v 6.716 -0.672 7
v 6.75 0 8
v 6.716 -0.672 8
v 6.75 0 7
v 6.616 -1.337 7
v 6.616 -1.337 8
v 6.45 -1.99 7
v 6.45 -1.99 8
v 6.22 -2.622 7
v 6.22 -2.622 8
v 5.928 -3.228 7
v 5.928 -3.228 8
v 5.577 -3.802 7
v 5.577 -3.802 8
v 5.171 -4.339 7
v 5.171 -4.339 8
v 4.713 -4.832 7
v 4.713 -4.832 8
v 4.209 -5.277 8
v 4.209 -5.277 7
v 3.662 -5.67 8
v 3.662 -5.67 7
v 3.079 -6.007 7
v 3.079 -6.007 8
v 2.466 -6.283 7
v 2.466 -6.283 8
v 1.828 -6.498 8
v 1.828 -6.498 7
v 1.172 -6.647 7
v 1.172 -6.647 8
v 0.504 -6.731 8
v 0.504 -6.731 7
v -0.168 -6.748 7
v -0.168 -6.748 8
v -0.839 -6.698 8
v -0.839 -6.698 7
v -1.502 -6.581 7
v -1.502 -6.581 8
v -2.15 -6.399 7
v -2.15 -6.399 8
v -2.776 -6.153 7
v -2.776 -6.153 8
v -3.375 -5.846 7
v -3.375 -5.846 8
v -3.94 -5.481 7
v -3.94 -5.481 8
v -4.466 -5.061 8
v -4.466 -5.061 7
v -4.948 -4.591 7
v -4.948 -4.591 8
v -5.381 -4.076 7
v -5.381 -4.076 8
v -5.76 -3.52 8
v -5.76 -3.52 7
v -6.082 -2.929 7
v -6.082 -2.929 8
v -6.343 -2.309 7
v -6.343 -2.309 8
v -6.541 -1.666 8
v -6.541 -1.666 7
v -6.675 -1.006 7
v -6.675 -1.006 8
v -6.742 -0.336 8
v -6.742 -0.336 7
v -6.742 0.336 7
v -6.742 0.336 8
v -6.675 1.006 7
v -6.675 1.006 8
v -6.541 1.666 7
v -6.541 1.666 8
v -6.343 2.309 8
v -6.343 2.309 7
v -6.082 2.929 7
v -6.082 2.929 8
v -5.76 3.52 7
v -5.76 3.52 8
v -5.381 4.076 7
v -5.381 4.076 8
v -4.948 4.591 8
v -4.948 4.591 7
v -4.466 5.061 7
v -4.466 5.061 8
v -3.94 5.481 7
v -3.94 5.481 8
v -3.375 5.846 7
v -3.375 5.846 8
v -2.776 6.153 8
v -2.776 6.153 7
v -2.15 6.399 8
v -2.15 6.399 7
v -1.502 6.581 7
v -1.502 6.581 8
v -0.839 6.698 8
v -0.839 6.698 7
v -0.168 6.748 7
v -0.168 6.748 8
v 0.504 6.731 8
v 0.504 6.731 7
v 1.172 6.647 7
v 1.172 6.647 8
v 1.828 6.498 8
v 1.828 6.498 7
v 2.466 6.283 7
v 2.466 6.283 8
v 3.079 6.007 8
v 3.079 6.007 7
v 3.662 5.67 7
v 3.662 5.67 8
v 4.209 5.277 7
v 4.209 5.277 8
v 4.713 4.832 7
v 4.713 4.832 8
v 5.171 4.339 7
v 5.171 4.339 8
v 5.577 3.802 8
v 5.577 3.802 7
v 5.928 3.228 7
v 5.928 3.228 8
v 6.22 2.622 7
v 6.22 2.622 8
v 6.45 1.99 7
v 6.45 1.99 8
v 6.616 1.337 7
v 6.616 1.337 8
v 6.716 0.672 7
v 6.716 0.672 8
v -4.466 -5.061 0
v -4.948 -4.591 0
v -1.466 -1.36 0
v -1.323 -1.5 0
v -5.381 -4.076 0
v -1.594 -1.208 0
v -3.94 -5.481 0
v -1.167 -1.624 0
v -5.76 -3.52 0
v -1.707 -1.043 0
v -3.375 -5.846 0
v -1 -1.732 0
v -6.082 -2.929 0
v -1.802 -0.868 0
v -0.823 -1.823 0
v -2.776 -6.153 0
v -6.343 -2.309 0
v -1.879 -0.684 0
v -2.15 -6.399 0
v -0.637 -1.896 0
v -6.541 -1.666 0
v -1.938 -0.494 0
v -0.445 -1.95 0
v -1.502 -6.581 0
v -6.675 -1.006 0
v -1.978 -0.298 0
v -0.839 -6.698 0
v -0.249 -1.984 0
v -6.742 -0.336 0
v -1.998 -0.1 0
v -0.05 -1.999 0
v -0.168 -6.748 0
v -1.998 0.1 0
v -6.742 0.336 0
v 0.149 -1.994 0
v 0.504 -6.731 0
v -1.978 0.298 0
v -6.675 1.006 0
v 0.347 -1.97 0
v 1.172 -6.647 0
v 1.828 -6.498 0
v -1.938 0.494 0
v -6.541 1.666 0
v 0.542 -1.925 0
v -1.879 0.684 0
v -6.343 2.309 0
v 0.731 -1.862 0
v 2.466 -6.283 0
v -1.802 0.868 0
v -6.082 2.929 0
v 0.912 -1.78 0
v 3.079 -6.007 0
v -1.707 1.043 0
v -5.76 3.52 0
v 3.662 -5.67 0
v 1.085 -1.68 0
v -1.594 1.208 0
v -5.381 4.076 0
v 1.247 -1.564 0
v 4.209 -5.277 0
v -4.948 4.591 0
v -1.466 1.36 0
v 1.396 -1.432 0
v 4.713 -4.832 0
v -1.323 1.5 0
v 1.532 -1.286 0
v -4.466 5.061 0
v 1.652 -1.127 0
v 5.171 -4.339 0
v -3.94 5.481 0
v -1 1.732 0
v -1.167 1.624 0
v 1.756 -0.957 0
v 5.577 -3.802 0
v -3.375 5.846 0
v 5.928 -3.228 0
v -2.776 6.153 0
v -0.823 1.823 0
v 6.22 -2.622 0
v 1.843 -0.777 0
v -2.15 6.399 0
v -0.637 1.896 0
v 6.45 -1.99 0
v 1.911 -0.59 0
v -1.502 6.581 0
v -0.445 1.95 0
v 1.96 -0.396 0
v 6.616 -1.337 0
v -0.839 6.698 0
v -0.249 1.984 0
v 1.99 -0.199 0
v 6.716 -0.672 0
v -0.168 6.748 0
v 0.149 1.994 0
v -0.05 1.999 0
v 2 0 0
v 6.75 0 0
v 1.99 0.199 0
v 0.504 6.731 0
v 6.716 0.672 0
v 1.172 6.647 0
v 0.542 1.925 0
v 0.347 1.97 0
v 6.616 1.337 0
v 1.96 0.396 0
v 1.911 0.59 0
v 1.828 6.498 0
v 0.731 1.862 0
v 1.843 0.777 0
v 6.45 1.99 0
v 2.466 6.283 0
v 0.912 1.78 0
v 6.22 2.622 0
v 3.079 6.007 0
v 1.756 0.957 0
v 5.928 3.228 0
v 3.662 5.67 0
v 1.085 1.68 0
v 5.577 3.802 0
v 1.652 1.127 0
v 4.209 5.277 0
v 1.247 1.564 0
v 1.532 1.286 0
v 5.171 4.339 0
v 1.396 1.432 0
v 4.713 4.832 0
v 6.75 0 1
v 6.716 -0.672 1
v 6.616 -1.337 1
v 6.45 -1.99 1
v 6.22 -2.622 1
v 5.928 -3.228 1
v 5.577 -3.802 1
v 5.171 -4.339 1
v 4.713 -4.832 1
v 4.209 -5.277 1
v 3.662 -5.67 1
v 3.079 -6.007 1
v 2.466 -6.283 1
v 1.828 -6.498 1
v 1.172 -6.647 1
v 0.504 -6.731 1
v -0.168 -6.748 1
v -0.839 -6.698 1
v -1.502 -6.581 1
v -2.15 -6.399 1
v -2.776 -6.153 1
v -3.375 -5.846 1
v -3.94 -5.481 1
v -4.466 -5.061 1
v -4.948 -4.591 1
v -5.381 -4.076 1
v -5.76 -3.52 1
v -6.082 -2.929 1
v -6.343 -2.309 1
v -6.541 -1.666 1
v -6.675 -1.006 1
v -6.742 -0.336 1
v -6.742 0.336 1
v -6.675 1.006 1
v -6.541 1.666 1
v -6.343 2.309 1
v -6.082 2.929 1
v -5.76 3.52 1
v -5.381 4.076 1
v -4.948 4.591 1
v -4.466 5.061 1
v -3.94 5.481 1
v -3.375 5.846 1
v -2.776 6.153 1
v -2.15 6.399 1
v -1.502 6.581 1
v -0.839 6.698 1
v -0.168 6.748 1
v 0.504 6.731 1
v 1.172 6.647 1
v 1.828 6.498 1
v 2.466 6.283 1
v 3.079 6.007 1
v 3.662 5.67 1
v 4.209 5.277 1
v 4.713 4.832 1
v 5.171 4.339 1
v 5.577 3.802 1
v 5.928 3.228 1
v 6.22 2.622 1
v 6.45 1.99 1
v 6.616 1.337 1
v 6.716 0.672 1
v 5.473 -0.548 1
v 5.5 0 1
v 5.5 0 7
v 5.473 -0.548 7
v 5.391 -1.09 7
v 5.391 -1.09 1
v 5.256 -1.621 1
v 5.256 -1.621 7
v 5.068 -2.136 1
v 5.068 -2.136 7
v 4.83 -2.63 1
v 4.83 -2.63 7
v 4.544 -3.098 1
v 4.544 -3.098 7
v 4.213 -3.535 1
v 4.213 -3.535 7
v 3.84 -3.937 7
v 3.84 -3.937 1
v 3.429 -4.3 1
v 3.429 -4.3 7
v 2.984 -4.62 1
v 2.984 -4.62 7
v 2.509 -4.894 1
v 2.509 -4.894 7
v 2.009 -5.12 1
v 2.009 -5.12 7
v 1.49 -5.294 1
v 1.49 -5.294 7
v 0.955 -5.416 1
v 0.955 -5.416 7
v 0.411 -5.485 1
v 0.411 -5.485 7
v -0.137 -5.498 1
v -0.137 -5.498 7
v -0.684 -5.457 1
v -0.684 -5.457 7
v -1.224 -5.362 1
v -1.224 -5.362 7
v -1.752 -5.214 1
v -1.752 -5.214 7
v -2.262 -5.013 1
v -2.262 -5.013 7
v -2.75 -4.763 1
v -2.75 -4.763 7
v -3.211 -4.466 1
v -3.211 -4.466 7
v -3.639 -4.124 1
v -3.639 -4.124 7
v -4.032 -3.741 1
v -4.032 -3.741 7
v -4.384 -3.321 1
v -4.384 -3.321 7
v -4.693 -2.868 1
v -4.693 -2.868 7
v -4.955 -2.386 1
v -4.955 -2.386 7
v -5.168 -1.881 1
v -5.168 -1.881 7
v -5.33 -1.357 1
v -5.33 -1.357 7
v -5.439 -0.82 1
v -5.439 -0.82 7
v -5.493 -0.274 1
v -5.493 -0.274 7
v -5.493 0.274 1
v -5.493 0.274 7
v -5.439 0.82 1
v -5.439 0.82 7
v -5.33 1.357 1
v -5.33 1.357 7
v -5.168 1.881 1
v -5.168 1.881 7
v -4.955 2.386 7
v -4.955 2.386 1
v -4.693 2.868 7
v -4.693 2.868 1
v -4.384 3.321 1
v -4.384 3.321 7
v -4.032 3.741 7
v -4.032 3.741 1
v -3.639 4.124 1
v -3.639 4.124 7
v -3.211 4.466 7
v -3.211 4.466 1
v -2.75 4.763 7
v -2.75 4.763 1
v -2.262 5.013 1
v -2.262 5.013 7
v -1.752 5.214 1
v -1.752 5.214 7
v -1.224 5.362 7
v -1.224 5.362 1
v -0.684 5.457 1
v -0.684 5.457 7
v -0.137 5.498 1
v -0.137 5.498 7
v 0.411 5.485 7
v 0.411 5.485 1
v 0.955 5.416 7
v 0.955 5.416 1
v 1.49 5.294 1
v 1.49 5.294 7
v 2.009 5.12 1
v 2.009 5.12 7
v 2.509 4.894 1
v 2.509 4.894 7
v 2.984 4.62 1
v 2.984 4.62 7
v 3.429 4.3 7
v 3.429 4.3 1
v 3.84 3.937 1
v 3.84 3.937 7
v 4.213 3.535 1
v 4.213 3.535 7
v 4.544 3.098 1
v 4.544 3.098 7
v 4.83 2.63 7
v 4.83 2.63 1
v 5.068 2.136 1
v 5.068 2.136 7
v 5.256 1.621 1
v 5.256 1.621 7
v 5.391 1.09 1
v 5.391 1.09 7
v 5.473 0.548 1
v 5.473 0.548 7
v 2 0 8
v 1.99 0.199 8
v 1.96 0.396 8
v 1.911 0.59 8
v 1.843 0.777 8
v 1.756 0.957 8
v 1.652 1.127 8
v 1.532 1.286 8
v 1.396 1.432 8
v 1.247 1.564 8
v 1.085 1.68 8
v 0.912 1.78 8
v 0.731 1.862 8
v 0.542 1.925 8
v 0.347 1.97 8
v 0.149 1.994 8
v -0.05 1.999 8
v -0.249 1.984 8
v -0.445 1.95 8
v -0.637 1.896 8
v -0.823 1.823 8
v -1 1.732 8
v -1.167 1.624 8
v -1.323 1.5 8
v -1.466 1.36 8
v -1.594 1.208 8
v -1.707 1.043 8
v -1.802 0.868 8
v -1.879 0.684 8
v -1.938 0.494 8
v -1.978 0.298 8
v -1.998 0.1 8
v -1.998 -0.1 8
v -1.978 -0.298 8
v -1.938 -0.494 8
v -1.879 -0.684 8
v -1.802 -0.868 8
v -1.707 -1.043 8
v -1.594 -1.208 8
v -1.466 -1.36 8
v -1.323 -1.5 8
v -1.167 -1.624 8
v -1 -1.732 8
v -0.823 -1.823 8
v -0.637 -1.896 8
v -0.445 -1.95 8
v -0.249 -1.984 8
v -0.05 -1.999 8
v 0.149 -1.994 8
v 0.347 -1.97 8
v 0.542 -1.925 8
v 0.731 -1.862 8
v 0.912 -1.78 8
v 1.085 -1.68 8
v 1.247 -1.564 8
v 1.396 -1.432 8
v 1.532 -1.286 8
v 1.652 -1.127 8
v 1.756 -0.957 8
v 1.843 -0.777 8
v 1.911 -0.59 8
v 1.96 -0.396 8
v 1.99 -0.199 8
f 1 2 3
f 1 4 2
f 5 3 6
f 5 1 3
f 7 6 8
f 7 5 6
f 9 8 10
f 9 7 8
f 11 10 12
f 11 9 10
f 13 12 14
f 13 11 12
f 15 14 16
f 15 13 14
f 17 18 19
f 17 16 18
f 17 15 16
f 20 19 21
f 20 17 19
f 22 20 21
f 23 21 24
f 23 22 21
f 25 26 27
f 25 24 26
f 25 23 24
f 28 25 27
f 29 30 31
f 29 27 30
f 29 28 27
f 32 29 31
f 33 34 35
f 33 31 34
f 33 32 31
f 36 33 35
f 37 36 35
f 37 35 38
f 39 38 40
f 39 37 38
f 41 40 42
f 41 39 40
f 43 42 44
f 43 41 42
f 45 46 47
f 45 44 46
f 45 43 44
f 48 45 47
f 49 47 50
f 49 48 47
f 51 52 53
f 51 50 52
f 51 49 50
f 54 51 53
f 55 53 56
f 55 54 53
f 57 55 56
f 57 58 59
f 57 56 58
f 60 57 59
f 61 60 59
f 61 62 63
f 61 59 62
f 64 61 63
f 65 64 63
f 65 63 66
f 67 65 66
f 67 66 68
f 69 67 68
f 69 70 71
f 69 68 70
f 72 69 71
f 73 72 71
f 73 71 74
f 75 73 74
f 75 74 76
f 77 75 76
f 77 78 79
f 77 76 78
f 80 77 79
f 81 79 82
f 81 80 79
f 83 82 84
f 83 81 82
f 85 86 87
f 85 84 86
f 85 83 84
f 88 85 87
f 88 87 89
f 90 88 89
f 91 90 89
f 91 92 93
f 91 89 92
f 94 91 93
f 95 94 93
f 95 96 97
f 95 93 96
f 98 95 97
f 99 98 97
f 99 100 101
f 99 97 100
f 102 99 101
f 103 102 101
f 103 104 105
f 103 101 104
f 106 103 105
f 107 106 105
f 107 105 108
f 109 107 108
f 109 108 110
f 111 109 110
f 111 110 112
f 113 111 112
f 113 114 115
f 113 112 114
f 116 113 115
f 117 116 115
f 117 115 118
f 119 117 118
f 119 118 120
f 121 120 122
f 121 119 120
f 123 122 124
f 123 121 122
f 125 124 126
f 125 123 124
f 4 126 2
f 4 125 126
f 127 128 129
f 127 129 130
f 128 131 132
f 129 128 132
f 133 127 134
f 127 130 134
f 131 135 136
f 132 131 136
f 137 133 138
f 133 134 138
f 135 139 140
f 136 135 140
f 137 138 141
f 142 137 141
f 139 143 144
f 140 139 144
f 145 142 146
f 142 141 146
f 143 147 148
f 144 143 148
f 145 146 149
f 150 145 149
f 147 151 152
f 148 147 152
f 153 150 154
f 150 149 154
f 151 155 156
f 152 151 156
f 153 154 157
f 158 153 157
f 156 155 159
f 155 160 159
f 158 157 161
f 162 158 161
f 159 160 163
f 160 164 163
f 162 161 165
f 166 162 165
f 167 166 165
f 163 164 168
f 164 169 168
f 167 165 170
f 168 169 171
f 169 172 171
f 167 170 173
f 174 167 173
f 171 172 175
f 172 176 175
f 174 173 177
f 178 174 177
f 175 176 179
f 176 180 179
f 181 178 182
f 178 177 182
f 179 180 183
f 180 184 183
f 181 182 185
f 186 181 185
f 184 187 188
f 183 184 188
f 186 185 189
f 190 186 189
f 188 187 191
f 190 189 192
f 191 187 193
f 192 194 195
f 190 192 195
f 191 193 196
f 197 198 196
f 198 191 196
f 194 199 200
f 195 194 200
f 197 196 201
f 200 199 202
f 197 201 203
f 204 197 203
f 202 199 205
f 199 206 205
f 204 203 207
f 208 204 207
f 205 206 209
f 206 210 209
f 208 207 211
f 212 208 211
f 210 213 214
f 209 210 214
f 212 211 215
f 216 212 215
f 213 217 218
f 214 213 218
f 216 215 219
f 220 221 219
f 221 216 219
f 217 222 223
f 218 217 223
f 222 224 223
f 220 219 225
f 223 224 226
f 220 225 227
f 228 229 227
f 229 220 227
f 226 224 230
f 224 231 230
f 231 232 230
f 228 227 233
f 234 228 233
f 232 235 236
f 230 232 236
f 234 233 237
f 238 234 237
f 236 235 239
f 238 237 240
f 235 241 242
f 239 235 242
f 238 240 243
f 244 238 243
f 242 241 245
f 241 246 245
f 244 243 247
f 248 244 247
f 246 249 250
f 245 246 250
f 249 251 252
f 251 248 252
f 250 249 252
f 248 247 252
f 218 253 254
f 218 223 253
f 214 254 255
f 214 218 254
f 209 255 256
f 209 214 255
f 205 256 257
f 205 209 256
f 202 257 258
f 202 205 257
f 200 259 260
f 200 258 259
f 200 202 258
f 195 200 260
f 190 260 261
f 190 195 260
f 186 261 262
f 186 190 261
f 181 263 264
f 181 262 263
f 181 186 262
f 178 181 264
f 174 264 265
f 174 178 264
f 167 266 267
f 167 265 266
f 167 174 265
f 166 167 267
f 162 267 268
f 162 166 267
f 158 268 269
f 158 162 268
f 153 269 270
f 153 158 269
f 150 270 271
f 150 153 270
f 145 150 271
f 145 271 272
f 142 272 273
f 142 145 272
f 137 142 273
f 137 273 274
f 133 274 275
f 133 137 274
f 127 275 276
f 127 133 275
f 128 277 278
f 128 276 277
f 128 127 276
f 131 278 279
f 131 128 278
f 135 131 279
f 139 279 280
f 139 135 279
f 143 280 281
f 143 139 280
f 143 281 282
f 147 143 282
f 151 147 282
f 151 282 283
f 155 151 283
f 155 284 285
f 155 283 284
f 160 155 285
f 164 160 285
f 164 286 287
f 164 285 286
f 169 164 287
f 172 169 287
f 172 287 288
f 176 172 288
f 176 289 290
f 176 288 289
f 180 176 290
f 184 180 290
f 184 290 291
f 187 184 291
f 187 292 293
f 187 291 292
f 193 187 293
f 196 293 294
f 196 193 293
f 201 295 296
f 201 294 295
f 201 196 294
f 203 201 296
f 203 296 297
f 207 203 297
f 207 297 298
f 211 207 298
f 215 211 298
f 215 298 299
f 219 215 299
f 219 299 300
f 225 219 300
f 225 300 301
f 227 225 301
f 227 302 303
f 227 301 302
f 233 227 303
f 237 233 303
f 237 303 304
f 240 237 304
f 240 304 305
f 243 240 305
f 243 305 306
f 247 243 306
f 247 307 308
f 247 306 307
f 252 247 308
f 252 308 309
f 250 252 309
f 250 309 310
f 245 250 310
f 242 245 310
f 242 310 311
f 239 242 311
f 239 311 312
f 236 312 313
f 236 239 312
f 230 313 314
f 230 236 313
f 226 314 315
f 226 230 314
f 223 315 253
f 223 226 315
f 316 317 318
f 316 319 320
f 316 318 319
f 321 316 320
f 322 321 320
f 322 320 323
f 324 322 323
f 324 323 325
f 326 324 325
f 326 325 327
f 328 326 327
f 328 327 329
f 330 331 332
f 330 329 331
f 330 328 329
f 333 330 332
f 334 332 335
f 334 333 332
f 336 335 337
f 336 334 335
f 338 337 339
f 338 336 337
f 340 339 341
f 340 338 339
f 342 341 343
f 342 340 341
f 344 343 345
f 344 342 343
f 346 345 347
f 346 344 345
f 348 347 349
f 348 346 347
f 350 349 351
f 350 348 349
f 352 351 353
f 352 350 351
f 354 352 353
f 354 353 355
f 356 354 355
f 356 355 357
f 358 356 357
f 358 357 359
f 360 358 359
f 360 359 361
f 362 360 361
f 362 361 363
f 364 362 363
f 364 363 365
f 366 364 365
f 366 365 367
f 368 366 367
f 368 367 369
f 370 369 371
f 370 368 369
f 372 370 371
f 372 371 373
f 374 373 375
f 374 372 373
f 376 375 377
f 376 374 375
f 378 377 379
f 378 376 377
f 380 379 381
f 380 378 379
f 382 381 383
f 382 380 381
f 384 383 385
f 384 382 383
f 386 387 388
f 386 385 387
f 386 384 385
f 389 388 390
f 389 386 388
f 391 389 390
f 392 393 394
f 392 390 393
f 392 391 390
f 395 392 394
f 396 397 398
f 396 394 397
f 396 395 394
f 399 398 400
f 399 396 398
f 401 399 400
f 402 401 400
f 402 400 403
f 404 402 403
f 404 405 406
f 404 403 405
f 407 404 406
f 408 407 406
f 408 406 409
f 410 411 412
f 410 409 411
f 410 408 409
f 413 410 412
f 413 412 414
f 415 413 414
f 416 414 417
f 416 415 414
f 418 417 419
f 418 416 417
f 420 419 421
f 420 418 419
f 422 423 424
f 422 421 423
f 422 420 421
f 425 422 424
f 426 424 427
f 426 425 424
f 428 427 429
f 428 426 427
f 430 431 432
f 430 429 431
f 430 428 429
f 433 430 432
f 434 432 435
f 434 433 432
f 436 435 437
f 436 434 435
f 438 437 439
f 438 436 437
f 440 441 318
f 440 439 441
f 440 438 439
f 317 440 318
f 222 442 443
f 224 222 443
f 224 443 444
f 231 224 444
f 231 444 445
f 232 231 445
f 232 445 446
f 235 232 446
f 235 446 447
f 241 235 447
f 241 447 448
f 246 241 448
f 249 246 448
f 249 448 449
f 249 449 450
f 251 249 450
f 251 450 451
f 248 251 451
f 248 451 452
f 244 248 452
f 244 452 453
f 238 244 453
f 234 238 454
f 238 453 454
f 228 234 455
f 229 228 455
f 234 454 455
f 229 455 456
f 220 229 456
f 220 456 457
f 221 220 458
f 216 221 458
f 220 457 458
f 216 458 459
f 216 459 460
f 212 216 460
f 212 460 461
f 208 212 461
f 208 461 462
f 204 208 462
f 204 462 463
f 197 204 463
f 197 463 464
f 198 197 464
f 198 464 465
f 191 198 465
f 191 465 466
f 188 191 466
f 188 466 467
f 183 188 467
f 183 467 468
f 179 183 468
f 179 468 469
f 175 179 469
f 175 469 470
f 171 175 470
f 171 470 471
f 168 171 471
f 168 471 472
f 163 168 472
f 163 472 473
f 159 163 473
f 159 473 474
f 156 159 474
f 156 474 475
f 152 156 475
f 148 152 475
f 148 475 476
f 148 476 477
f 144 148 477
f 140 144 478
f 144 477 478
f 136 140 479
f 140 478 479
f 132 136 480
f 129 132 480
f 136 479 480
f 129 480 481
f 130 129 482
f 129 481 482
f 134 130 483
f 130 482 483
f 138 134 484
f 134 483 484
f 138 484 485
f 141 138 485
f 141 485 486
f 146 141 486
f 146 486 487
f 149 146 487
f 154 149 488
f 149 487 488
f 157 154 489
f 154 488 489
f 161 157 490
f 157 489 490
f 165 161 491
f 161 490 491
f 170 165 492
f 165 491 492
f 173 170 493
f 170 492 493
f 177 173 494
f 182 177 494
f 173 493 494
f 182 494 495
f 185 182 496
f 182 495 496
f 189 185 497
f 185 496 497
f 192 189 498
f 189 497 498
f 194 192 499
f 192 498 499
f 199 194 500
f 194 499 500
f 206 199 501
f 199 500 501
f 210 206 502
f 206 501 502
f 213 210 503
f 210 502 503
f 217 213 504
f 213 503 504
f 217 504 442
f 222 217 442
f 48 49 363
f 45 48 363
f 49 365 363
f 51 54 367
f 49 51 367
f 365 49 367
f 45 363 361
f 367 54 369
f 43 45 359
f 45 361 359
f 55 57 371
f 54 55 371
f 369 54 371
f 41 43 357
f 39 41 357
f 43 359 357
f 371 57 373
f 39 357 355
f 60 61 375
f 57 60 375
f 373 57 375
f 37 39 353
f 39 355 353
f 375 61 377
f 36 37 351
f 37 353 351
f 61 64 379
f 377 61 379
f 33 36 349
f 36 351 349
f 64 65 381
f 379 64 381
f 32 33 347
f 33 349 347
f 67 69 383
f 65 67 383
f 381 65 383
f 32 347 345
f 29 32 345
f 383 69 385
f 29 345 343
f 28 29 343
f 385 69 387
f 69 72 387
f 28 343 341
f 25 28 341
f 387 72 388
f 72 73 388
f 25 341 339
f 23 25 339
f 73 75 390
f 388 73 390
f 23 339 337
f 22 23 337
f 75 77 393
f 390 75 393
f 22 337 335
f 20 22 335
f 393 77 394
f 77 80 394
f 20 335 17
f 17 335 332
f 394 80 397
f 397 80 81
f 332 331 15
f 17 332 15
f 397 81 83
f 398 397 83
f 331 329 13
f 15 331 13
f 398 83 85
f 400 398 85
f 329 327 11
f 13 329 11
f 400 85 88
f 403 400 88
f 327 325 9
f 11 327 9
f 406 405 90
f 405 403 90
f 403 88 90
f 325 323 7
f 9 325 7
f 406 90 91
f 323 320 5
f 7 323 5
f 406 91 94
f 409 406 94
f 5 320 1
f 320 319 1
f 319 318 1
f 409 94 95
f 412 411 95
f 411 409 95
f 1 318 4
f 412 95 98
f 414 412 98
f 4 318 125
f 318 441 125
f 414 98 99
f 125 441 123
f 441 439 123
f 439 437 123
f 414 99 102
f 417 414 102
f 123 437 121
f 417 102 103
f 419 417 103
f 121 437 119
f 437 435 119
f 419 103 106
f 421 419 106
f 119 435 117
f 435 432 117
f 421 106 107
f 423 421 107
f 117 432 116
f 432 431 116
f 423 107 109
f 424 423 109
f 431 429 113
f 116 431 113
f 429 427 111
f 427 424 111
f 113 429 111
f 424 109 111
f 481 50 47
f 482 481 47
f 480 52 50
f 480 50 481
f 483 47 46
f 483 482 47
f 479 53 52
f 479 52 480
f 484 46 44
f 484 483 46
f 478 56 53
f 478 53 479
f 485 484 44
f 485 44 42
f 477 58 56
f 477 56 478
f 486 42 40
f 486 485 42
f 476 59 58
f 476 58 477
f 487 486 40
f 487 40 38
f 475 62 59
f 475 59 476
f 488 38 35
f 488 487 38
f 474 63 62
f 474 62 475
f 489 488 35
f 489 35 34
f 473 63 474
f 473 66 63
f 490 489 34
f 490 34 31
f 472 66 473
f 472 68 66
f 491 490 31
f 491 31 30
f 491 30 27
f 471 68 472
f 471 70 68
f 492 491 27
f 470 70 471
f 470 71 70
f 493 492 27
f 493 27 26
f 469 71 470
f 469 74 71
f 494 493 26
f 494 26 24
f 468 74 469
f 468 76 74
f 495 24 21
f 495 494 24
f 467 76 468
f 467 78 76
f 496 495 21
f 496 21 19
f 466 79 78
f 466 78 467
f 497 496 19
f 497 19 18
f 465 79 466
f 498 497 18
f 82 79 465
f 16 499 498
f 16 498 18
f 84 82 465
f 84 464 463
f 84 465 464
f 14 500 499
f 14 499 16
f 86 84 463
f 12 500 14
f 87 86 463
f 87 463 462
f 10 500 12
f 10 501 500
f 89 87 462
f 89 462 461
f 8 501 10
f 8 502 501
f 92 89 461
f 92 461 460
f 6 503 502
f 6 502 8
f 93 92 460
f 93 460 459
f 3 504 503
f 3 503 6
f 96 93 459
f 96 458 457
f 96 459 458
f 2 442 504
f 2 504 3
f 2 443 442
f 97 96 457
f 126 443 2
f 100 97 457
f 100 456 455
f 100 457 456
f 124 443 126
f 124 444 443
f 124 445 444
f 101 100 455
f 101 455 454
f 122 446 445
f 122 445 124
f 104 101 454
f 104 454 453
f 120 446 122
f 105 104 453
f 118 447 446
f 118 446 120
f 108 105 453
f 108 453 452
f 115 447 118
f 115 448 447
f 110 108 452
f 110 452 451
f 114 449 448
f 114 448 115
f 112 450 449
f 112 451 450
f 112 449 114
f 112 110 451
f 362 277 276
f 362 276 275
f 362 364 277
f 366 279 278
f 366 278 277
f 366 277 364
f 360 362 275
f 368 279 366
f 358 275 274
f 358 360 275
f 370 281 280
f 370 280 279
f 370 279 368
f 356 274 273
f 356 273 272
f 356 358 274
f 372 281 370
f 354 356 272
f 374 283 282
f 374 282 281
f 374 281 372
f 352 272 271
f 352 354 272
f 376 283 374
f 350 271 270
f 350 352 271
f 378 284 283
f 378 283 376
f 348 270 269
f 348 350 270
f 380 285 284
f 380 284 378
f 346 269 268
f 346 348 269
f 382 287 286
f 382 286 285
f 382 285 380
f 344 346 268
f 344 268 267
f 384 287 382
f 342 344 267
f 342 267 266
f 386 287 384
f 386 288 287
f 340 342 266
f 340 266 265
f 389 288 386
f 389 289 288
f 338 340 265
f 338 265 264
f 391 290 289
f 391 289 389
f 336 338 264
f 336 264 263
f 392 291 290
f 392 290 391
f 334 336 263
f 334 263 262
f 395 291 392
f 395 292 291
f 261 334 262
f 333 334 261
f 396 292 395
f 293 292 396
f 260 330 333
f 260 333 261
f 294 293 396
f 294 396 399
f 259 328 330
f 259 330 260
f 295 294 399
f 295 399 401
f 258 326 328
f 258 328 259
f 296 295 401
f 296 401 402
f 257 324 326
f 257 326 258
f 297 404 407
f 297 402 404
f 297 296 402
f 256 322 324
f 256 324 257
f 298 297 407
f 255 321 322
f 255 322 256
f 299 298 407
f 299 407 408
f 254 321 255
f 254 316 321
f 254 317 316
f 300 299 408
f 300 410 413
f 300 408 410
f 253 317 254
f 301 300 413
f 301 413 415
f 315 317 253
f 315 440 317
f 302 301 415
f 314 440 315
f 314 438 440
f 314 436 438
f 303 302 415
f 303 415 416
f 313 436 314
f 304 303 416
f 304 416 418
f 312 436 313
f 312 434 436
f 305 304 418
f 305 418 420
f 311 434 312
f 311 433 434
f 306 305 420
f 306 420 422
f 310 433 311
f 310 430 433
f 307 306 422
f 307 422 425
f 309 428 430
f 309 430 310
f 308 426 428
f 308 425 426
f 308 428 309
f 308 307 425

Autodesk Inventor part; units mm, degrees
ref_plane "YZ Plane" through (0, 0, 0) normal (1, 0, 0) x (0, 1, 0)
ref_plane "XZ Plane" through (0, 0, 0) normal (0, 1, 0) x (-1, 0, 0)
ref_plane "XY Plane" through (0, 0, 0) normal (0, 0, 1) x (1, 0, 0)
sketch "Sketch1" plane through (0, 0, 0) normal (0, 0, 1) x (1, 0, 0)
  circle A0 centre (0, 0) radius 6.75
  dimension "d0" = 13.5
extrude "Extrusion1" add sketch "Sketch1" along normal blind 1
sketch "Sketch2" plane through (0, 0, 1) normal (0, 0, 1) x (1, 0, 0)
  circle A0 centre (0, 0) radius 6.75 projected
  circle A1 centre (0, 0) radius 5.5
  dimension "d3" = 11
extrude "Extrusion2" add sketch "Sketch2" along normal blind 6 contours A1
sketch "Sketch3" plane through (0, 0, 7) normal (0, 0, 1) x (1, 0, 0)
  circle A0 centre (0, 0) radius 5.5 projected
  circle A1 centre (0, 0) radius 6.75
  dimension "d6" = 13.5
extrude "Extrusion3" add sketch "Sketch3" along normal blind 1 contours A0 | A1
sketch "Sketch4" plane through (0, 0, 8) normal (0, 0, 1) x (1, 0, 0)
  circle A0 centre (0, 0) radius 6.75 projected
  circle A1 centre (0, 0) radius 2
  dimension "d9" = 4
extrude "Extrusion4" cut sketch "Sketch4" against normal blind 15 contours A1
properties material "Stainless Steel"
